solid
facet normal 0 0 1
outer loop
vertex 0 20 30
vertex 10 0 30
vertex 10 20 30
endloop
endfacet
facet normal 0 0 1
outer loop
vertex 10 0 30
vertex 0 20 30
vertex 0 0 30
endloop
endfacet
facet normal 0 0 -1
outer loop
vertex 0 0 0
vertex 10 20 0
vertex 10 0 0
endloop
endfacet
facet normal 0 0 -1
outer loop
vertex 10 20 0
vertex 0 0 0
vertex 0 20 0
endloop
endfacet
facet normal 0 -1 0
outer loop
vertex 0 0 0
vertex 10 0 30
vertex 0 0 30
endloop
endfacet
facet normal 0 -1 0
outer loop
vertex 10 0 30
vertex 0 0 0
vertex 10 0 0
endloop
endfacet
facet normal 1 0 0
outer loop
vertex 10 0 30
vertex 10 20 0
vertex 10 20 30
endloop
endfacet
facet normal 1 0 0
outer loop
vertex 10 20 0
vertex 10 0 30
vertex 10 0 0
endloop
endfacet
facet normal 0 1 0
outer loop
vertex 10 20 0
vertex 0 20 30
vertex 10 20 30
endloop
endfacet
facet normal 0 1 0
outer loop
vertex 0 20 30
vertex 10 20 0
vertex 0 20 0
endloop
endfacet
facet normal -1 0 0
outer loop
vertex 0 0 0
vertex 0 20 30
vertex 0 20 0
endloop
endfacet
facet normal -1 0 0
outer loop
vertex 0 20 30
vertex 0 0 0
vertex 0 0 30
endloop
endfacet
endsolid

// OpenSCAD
// Generated by scadwright. Do not hand-edit —
// edit the Python source and regenerate.

cube([10, 20, 30], center=false);
